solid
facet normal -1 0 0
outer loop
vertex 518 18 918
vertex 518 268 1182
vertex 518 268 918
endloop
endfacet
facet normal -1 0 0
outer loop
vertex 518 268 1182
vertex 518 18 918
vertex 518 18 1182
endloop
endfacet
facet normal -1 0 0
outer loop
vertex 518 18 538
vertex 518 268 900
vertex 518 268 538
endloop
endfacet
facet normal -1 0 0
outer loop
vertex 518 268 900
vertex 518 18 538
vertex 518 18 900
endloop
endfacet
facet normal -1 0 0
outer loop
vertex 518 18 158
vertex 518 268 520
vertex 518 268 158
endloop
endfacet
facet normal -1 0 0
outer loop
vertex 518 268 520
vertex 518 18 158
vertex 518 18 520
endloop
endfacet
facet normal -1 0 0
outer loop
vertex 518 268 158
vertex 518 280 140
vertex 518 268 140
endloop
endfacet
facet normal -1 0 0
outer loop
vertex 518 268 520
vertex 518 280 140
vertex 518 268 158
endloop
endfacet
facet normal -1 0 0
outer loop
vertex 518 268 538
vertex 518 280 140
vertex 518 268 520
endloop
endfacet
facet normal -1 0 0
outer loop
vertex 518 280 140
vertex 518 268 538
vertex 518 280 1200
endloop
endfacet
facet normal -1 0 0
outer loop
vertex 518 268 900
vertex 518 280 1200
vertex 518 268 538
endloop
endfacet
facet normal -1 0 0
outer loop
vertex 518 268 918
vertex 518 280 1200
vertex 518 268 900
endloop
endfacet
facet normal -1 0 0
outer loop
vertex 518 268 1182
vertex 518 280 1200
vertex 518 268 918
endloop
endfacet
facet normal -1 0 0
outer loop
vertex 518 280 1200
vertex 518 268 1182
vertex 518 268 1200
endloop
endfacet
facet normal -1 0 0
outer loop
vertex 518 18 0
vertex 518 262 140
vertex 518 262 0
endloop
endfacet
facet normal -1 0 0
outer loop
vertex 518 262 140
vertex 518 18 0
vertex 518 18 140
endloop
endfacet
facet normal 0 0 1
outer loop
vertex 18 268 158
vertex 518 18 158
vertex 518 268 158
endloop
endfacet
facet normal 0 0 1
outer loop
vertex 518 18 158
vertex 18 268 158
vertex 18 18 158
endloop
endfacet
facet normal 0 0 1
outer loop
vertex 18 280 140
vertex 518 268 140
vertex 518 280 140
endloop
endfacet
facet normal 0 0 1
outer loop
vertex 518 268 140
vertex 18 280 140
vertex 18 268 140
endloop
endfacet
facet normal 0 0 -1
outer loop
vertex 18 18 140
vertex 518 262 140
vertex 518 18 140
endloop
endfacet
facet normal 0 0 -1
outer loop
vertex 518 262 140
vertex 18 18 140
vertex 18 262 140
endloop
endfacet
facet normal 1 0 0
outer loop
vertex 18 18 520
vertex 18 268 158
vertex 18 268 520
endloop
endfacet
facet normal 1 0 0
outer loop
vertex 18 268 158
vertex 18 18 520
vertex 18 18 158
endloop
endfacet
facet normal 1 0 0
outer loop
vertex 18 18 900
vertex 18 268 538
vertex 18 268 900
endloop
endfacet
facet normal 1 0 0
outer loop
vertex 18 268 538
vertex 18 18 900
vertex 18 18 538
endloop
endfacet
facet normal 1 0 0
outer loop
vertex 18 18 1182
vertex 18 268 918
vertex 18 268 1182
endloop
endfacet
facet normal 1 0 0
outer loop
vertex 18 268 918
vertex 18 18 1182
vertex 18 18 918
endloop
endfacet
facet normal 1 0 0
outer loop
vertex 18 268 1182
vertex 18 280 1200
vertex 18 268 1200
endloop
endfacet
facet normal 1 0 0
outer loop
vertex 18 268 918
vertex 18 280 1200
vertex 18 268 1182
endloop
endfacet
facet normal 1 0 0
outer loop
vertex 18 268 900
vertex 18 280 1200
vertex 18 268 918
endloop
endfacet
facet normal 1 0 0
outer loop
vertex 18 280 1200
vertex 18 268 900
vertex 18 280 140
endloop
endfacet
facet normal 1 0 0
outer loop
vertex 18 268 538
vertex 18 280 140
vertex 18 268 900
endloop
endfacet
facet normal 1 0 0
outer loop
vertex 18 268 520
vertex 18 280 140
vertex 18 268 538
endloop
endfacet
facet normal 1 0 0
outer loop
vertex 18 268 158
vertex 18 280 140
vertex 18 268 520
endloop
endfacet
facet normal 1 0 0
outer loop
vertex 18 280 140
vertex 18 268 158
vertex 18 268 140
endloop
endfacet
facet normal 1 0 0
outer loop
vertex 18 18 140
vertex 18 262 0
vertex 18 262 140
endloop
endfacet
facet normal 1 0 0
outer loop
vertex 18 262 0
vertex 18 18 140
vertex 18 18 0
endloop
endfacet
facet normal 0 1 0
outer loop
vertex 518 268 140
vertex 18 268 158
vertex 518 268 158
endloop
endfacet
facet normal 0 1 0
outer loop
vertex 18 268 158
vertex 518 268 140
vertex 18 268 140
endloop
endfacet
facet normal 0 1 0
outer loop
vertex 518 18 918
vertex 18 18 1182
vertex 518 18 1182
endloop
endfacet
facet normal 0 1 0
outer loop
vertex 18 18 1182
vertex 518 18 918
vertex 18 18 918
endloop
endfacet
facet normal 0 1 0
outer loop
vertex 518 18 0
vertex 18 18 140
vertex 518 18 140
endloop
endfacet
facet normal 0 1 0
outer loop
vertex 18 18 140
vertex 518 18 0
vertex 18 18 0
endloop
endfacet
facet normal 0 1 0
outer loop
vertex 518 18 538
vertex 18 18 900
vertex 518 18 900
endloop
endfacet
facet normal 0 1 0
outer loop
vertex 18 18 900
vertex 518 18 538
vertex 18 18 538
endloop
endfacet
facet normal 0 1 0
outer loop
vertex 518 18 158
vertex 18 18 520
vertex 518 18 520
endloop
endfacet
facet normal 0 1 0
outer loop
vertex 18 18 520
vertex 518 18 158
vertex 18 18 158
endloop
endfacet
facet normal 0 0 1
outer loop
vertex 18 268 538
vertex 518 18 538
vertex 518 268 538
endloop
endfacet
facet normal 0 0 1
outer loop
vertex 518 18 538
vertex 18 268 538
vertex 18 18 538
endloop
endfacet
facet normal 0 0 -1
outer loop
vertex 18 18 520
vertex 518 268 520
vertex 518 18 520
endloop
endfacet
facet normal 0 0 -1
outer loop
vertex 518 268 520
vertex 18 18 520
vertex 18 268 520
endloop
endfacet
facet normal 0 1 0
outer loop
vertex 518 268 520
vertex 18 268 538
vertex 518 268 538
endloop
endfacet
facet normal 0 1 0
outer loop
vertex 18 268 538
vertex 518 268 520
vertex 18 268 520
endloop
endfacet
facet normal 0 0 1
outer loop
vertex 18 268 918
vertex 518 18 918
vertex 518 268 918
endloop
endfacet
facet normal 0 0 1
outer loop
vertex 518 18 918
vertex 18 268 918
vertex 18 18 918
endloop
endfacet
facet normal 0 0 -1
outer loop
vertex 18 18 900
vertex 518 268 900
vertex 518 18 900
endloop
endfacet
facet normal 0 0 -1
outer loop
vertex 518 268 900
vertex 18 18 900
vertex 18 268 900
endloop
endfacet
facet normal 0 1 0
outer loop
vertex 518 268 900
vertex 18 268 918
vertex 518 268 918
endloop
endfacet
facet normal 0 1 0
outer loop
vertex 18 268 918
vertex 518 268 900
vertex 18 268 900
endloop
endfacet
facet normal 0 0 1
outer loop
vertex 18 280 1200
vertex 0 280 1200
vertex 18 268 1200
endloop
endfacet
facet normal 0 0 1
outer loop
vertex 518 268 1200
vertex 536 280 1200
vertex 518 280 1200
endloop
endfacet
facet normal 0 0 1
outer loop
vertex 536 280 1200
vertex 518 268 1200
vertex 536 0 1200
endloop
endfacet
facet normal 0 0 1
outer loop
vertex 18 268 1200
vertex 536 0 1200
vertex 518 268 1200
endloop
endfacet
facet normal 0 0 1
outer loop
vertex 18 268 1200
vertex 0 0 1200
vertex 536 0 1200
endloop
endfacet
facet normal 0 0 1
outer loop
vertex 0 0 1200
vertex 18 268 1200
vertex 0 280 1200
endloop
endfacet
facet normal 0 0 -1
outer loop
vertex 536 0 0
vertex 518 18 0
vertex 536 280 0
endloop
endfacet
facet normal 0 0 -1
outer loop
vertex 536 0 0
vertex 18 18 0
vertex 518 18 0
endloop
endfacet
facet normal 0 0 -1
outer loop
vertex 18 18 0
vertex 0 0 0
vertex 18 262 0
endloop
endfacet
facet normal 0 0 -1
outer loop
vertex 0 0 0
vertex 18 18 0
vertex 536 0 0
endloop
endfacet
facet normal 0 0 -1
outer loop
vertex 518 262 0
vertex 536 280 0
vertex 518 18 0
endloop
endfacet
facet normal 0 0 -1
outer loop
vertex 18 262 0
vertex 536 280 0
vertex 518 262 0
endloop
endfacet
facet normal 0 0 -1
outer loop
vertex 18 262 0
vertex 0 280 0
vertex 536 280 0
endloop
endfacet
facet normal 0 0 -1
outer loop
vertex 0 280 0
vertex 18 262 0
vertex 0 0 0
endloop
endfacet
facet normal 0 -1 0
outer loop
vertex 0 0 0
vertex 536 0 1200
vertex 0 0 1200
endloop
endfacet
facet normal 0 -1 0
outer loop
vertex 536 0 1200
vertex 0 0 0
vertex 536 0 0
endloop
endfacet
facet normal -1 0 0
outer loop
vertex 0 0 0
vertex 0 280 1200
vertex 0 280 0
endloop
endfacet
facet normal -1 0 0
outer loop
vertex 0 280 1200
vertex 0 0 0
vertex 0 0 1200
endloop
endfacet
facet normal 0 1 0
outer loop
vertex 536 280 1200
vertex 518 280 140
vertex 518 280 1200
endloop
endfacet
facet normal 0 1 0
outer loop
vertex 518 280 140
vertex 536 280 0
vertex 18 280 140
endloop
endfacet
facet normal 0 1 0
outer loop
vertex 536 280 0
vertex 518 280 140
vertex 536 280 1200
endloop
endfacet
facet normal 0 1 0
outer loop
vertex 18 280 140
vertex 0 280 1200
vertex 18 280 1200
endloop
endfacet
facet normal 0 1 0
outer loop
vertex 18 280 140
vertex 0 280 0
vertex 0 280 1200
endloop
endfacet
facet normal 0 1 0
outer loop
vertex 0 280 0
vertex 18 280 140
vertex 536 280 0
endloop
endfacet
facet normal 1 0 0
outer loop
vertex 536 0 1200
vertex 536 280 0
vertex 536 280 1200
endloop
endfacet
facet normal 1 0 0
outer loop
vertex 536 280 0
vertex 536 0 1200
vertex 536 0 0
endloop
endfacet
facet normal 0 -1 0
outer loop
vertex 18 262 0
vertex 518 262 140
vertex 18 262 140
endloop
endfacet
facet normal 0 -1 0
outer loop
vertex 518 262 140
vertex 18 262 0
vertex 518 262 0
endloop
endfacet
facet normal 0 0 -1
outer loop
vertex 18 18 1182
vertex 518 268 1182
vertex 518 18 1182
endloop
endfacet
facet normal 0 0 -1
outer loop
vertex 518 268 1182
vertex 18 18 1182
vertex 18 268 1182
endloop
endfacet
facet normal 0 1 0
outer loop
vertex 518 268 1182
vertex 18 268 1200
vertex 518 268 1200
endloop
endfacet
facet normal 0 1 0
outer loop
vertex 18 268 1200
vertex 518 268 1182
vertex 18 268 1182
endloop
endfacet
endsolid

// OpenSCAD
step = 380;
thickness = 18;
total_side = 280;
total_width = 500;
total_height = 1200;
height_kickplate = 140;

module Side(x) {
 translate([x, 0, 0]) {
  cube([ thickness
       , total_side
       , total_height], false);
 }
}

module Back() {
 translate([thickness, 0, 0]) {
  cube([ total_width
       , thickness
       , total_height], false);
 }
}

module Shelf(z) {
 side = 250;
 translate([ thickness
           , thickness
           , z]) {
  cube([ total_width
       , side
       , thickness], false);
 }
}

module Kickplate() {
 translate([ thickness
           , total_side - thickness
           , 0]) {
  cube([ total_width
       , thickness
       , height_kickplate], false);
 }
}

#Back();
#Side(0);
Side(total_width + thickness);
#Kickplate();

Shelf(total_height - thickness);
for (k = [ height_kickplate
         : step
         : total_height
         ]) {
 Shelf(k);
}
